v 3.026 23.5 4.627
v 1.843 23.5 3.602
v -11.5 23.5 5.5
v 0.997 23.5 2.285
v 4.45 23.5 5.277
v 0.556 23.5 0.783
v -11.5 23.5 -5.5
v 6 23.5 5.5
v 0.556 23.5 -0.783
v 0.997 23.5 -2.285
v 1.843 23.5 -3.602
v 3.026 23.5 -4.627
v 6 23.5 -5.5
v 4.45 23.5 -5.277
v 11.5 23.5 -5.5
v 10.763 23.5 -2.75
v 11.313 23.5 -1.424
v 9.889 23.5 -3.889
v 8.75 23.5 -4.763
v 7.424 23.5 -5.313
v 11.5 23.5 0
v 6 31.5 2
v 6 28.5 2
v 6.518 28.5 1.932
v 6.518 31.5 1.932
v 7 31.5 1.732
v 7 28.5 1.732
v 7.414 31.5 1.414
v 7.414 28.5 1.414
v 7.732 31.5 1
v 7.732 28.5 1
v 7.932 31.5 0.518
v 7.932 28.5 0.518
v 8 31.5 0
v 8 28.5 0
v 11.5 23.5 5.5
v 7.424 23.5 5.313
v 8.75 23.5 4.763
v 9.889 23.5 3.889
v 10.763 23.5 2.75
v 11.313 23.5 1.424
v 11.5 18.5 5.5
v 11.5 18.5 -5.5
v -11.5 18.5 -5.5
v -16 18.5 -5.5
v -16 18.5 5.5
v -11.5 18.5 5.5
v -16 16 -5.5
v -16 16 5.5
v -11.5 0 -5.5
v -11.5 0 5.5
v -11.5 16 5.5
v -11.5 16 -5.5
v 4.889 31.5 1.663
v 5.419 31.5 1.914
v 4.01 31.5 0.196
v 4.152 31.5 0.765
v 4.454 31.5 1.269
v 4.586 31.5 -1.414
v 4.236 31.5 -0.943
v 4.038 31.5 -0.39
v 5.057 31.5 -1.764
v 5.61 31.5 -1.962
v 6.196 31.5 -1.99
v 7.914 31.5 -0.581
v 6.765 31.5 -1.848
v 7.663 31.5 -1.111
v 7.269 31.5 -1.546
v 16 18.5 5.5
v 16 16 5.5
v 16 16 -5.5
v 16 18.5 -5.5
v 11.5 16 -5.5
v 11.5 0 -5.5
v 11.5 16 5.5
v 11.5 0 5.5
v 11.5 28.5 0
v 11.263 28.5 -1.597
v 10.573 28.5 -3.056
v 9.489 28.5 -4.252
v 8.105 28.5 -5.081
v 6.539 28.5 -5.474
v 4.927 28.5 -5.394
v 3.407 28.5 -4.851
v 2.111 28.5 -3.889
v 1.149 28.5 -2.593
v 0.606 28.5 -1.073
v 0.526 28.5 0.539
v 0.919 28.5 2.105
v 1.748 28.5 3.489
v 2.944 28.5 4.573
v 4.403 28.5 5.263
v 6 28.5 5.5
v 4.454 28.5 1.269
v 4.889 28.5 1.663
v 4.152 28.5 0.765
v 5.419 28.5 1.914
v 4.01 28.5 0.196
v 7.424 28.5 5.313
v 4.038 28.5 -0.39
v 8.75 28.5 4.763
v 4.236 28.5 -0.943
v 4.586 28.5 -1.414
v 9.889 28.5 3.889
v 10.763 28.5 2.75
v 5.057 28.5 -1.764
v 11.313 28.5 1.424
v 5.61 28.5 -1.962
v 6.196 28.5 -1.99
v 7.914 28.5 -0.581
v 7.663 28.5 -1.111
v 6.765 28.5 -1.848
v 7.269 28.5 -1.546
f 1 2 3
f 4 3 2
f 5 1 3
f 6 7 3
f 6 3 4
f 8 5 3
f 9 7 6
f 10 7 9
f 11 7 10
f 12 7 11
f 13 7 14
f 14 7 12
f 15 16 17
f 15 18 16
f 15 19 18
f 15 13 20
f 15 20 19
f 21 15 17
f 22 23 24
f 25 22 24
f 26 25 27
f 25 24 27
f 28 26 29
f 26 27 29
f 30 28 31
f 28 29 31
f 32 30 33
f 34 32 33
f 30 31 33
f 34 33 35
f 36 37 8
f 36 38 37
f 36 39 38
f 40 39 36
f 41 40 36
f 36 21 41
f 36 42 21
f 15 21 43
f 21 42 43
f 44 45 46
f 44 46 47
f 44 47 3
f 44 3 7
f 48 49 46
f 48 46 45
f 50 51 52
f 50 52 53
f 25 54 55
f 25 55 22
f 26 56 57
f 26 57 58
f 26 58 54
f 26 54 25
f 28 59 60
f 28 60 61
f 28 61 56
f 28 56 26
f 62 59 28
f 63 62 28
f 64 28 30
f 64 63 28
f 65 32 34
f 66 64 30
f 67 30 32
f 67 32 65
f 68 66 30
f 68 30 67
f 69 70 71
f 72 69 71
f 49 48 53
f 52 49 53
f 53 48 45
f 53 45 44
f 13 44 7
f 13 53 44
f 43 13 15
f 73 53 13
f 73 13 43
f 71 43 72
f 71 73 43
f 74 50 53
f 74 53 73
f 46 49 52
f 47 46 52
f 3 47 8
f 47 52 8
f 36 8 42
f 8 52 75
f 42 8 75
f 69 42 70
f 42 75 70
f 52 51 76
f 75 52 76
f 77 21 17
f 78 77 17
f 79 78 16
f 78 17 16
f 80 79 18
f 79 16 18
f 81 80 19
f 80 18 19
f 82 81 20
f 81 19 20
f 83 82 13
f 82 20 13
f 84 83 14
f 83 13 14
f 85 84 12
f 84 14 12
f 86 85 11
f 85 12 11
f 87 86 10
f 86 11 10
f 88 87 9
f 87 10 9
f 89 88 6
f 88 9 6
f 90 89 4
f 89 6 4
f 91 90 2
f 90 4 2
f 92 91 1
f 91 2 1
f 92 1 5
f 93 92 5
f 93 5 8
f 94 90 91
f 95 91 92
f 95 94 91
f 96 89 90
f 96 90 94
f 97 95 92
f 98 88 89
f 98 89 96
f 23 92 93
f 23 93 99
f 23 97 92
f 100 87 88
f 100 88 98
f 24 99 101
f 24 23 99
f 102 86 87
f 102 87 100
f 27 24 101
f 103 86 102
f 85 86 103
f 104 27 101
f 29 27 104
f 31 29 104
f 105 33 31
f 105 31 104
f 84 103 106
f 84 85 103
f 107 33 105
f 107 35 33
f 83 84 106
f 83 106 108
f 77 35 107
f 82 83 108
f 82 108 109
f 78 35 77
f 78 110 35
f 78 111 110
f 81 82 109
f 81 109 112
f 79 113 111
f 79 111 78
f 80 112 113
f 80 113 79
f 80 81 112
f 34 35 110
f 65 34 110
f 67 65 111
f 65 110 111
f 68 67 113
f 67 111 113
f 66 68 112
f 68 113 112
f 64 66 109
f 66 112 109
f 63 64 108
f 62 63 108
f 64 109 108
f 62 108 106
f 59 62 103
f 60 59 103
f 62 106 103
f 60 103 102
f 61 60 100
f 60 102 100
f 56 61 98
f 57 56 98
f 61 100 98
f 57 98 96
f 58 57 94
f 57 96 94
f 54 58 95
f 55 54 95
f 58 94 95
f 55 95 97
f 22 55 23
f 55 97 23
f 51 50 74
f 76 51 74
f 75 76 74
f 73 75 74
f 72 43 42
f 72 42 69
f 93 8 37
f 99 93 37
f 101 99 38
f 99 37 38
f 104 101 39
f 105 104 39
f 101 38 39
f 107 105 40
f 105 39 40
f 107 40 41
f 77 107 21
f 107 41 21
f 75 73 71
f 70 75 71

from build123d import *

# Parameters (mm, degrees)
SKETCH1_W           = 23
SKETCH1_H           = 11
BOSS_EXTRUDE1_DEPTH = 16
SKETCH2_W           = 32
SKETCH2_H           = 11
BOSS_EXTRUDE2_DEPTH = 2.5
SKETCH3_W           = 23
SKETCH3_H           = 11
BOSS_EXTRUDE3_DEPTH = 5
BOSS_EXTRUDE4_DEPTH = 5
BOSS_EXTRUDE5_DEPTH = 3


with BuildPart() as part:
    # Sketch1 → Boss-Extrude1 (new body)
    with BuildSketch(Plane(origin=(0, 0, 0), x_dir=(1, 0, 0), z_dir=(0, 1, 0))):
        Rectangle(SKETCH1_W, SKETCH1_H)
    extrude(amount=BOSS_EXTRUDE1_DEPTH)

    # Sketch2 → Boss-Extrude2 (add)
    with BuildSketch(Plane(origin=(0, 16, 0), x_dir=(1, 0, 0), z_dir=(0, 1, 0))):
        Rectangle(SKETCH2_W, SKETCH2_H)
    extrude(amount=BOSS_EXTRUDE2_DEPTH)

    # Sketch3 → Boss-Extrude3 (add)
    with BuildSketch(Plane(origin=(0, 18.5, 0), x_dir=(1, 0, 0), z_dir=(0, 1, 0))):
        Rectangle(SKETCH3_W, SKETCH3_H)
    extrude(amount=BOSS_EXTRUDE3_DEPTH)

    # Sketch4 → Boss-Extrude4 (add)
    with BuildSketch(Plane(origin=(0, 23.5, 0), x_dir=(1, 0, 0), z_dir=(0, 1, 0))):
        with BuildLine():
            ThreePointArc((11.5, 0), (2.110912703, 3.889087297), (6, -5.5))
            Line((6, -5.5), (6, 0))
            Line((6, 0), (11.5, 0))
        make_face()
        with BuildLine():
            Line((6, 0), (6, -5.5))
            ThreePointArc((6, -5.5), (9.889087297, -3.889087297), (11.5, 0))
            Line((11.5, 0), (6, 0))
        make_face()
    extrude(amount=BOSS_EXTRUDE4_DEPTH)

    # Sketch5 → Boss-Extrude5 (add)
    with BuildSketch(Plane(origin=(0, 28.5, 0), x_dir=(1, 0, 0), z_dir=(0, 1, 0))):
        with BuildLine():
            ThreePointArc((8, 0), (4.585786438, 1.414213562), (6, -2))
            Line((6, -2), (6, 0))
            Line((6, 0), (8, 0))
        make_face()
        with BuildLine():
            Line((6, 0), (6, -2))
            ThreePointArc((6, -2), (7.414213562, -1.414213562), (8, 0))
            Line((8, 0), (6, 0))
        make_face()
    extrude(amount=BOSS_EXTRUDE5_DEPTH)


solid = part.part
